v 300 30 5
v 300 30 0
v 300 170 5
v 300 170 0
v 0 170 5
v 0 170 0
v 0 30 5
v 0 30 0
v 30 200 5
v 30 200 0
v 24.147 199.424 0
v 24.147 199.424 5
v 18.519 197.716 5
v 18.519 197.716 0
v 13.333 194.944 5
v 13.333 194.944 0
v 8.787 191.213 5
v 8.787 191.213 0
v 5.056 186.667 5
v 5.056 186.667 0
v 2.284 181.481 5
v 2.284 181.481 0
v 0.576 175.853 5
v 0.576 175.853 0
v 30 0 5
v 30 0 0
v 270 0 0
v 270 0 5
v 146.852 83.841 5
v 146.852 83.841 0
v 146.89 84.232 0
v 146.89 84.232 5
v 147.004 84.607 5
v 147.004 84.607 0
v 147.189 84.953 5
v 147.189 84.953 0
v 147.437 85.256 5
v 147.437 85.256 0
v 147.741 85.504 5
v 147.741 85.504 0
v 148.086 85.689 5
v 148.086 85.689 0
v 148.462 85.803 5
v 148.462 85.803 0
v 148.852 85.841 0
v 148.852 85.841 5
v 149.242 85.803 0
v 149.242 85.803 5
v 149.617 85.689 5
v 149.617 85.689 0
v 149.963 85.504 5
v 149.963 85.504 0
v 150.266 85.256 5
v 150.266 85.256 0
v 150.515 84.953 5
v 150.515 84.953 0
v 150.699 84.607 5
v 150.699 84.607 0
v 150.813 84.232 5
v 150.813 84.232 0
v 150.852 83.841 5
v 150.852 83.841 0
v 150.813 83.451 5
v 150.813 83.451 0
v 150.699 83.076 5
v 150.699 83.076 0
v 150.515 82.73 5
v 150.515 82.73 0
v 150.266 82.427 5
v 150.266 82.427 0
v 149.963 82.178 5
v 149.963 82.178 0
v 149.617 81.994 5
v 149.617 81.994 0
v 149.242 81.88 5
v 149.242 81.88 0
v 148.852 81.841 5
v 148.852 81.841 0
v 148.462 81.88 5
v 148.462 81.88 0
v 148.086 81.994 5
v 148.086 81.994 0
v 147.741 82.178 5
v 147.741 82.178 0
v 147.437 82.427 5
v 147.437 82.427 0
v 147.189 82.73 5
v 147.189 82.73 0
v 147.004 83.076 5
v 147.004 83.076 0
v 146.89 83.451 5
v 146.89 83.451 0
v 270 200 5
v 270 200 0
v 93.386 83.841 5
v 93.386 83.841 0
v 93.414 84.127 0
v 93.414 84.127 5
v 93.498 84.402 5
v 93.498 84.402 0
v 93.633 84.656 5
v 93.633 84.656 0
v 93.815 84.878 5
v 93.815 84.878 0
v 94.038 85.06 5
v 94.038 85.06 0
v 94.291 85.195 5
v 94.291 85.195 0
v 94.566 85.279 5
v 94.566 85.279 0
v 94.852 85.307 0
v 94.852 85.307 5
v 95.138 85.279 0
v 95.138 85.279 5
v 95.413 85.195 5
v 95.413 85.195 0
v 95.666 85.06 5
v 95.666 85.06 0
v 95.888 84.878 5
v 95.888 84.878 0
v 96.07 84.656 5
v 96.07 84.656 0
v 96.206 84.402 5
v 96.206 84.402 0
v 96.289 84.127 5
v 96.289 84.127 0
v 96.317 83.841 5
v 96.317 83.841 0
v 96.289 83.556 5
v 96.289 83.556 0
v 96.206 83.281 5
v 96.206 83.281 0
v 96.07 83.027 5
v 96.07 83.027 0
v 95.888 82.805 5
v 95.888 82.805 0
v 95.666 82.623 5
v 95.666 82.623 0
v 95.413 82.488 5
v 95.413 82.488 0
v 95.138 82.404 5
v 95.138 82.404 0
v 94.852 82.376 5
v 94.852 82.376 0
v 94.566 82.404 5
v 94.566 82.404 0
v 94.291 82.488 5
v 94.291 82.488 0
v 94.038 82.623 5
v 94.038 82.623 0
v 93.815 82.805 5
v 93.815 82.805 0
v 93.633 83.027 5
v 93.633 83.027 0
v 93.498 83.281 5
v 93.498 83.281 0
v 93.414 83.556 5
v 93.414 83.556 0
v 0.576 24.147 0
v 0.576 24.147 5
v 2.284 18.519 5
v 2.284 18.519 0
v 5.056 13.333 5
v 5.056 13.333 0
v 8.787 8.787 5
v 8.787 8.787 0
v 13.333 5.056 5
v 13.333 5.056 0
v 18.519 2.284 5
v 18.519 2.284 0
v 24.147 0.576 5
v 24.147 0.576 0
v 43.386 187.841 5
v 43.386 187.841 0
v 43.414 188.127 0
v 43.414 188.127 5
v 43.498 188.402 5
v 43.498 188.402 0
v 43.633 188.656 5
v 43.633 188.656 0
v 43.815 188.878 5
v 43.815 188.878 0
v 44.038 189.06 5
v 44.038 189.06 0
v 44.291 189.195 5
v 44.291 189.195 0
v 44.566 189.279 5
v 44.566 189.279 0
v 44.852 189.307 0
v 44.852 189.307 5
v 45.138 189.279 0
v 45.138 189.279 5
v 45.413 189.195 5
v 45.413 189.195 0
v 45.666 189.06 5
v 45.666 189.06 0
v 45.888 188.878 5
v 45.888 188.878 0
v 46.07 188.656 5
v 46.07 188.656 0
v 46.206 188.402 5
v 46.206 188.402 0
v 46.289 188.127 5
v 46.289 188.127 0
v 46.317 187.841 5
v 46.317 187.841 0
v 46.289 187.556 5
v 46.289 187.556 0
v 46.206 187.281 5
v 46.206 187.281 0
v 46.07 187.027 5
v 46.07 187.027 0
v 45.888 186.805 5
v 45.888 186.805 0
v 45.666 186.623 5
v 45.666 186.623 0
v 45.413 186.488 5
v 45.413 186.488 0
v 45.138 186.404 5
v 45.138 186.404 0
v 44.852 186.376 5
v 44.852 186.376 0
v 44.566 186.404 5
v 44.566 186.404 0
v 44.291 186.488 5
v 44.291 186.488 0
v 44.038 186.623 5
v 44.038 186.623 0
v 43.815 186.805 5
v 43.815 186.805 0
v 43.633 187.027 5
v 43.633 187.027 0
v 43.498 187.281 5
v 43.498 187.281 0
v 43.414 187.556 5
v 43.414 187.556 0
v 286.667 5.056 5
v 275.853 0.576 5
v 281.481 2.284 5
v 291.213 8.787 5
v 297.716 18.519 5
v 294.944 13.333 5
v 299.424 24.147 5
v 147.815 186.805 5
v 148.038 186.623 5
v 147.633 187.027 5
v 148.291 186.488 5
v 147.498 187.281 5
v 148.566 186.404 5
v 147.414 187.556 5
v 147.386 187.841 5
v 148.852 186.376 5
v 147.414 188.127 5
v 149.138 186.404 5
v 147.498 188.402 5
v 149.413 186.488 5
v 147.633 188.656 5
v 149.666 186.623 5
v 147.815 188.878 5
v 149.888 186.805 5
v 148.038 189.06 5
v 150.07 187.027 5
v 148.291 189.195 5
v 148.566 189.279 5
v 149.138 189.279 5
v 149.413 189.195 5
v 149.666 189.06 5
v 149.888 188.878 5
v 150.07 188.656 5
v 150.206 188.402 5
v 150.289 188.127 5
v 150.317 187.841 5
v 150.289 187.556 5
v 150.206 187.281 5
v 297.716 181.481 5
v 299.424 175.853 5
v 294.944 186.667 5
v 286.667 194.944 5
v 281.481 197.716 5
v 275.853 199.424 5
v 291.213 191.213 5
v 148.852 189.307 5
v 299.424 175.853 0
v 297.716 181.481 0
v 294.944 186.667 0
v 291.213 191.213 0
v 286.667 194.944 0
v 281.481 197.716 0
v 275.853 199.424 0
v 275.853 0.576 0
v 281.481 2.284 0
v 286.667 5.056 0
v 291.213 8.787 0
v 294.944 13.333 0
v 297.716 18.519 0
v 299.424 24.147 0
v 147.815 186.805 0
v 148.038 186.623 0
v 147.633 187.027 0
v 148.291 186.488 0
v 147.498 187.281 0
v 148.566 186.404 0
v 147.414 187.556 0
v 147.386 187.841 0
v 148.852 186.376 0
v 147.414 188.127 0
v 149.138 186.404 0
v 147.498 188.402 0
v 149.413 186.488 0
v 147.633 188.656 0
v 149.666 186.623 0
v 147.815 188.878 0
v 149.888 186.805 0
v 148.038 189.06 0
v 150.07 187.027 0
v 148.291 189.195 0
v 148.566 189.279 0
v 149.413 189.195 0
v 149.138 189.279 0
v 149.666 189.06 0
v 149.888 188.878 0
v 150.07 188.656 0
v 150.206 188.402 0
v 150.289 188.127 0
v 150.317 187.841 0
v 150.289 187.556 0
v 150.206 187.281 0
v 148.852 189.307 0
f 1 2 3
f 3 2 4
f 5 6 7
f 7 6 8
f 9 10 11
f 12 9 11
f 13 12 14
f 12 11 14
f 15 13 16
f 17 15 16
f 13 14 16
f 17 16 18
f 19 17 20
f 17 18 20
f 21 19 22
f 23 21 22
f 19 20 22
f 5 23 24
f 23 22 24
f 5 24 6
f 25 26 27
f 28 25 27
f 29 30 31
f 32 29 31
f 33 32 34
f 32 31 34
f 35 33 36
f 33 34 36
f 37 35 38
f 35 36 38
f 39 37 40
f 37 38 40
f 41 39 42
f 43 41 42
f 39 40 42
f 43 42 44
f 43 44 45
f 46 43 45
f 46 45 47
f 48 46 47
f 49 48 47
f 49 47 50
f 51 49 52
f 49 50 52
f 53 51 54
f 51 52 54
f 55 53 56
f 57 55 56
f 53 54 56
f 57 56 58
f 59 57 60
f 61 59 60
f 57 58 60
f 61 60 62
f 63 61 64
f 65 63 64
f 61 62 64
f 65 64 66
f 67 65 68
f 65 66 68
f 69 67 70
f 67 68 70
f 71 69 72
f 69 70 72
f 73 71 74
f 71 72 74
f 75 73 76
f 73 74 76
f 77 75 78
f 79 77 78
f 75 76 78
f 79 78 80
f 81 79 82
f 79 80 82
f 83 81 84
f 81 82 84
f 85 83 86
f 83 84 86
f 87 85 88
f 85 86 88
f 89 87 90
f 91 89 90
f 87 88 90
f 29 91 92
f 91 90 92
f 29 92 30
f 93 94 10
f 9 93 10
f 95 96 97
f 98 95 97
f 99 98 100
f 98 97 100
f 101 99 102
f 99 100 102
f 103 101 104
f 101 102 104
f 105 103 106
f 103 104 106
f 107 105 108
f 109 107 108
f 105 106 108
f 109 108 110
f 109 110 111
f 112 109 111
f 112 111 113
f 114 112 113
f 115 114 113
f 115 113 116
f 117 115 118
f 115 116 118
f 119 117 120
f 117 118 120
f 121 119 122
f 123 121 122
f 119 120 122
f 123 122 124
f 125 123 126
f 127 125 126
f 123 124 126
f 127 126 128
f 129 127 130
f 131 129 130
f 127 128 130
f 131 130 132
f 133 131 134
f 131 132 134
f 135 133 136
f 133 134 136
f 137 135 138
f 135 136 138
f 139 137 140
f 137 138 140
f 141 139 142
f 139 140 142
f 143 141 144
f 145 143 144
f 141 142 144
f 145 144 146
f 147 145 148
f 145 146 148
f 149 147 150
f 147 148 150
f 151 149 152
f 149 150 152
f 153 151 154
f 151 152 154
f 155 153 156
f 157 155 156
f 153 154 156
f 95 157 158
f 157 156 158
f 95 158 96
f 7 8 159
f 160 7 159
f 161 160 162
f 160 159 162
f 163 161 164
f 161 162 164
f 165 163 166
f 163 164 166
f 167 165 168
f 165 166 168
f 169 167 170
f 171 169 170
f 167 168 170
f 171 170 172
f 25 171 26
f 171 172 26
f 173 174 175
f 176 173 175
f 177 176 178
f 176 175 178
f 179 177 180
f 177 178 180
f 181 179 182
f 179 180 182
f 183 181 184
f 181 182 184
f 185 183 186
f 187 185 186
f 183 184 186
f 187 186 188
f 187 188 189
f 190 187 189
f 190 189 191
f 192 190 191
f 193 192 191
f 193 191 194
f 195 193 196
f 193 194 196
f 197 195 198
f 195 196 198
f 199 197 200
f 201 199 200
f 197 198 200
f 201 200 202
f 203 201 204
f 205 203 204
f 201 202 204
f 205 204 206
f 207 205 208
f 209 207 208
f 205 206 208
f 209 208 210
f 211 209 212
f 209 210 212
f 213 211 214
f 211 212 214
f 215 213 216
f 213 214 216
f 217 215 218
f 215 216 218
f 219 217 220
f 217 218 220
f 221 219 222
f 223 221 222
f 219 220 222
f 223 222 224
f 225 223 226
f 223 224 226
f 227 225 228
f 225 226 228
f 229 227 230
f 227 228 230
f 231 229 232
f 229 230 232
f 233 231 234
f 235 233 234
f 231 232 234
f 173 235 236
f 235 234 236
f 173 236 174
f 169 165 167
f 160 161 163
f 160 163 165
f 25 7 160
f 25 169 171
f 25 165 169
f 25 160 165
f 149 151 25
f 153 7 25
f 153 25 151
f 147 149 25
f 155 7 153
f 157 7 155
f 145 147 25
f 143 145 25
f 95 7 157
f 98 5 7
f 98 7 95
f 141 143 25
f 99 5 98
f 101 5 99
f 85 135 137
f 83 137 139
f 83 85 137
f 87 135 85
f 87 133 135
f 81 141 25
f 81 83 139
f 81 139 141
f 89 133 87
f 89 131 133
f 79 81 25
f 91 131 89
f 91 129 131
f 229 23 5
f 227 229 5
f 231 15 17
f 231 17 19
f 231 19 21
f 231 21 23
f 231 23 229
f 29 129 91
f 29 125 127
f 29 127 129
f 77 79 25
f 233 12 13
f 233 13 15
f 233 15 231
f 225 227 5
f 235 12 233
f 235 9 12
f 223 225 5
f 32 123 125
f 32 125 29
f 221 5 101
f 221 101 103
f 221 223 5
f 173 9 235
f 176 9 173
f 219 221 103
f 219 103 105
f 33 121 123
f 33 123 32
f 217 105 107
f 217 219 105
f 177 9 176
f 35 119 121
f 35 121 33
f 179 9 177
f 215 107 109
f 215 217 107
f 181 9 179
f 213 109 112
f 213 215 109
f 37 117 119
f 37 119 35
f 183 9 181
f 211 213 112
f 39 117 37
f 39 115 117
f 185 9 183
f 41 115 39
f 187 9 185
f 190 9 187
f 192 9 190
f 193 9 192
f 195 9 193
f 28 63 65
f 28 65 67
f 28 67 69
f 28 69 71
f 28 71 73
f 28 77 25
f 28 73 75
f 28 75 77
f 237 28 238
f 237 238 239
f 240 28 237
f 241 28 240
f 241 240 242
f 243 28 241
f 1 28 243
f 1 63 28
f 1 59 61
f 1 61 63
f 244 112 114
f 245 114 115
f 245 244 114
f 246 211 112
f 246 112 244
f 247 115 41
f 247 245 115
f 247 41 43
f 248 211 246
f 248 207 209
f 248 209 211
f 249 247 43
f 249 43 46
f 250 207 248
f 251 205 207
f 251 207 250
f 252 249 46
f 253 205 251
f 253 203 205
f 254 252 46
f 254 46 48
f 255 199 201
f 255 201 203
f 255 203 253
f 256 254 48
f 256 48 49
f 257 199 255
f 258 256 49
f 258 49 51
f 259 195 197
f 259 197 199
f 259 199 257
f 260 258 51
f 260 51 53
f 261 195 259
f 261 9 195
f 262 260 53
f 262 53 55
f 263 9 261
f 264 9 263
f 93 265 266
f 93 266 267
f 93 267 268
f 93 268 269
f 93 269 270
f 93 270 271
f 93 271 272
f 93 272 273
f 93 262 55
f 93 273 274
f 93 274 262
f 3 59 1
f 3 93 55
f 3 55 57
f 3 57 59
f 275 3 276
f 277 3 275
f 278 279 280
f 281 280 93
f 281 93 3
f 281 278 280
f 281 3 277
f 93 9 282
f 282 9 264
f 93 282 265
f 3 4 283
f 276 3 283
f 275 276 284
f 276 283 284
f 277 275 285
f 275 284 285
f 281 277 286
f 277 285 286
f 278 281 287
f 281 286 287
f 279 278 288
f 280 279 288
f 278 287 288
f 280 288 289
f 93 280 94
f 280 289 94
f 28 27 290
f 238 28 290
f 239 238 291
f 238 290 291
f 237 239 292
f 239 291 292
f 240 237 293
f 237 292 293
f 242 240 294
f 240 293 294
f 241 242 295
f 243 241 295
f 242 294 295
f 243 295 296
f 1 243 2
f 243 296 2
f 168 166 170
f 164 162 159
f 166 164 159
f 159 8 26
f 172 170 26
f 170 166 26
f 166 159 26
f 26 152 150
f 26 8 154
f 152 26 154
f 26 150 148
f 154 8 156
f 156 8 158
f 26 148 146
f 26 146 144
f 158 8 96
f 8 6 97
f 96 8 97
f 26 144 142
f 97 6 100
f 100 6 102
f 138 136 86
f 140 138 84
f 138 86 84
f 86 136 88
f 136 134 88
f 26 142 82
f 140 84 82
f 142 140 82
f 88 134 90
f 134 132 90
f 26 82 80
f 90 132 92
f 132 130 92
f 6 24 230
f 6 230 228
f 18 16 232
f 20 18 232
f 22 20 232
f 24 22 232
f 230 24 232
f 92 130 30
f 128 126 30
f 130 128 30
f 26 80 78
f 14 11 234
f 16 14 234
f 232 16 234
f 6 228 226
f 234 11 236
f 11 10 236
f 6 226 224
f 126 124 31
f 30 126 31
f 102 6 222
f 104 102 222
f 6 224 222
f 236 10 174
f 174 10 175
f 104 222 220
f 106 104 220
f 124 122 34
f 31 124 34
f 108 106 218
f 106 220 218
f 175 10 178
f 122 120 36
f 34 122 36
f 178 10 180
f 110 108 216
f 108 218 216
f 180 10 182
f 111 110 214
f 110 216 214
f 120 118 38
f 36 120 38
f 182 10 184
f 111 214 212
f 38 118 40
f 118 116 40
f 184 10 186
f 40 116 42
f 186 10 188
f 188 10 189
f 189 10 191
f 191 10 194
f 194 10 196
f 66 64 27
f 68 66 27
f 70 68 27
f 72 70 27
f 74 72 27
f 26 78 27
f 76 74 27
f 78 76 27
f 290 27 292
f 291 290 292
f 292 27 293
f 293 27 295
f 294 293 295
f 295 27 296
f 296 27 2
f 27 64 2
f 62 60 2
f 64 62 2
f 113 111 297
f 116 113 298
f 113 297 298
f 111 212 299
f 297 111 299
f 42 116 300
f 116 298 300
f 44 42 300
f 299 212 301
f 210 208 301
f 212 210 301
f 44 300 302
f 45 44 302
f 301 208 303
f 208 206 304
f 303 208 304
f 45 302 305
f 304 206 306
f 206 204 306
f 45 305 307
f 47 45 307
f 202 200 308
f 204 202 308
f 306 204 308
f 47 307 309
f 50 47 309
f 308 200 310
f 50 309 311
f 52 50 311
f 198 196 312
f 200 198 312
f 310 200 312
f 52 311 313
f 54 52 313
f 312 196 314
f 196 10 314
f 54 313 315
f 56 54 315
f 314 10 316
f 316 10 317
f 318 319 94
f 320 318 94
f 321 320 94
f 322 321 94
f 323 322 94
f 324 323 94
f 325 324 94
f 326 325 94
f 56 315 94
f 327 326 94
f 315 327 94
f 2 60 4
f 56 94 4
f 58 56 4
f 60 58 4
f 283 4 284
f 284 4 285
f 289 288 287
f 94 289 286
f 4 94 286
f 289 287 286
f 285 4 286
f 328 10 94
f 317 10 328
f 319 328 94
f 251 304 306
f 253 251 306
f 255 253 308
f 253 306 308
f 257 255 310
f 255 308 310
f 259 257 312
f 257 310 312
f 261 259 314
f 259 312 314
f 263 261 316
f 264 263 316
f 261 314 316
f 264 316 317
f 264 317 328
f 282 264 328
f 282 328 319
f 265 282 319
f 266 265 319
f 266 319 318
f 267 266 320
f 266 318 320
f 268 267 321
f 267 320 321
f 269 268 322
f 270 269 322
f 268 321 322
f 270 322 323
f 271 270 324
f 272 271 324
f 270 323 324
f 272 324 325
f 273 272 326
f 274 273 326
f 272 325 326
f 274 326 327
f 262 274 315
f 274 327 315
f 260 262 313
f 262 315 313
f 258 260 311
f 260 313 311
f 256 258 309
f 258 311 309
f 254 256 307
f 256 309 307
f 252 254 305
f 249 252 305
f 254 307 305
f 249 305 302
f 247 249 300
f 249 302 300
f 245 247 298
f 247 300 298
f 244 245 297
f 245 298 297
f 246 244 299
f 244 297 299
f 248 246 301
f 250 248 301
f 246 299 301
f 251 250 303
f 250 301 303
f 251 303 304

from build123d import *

# Parameters (mm, degrees)
SALIENTE_EXTRUIR1_DEPTH = 5
CROQUIS2_R              = 1.465459125
CROQUIS2_R_2            = 2
CORTAR_EXTRUIR1_DEPTH   = 5


with BuildPart() as part:
    # Croquis1 → Saliente-Extruir1 (new body)
    with BuildSketch(Plane.XY):
        with BuildLine():
            Line((30, 0), (270, 0))
            ThreePointArc((270, 0), (291.213203436, 8.786796564), (300, 30))
            Line((300, 30), (300, 170))
            ThreePointArc((300, 170), (291.213203436, 191.213203436), (270, 200))
            Line((270, 200), (30, 200))
            ThreePointArc((30, 200), (8.786796564, 191.213203436), (0, 170))
            Line((0, 170), (0, 30))
            ThreePointArc((0, 30), (8.786796564, 8.786796564), (30, 0))
        make_face()
    extrude(amount=SALIENTE_EXTRUIR1_DEPTH)

    # Croquis2 → Cortar-Extruir1 (cut)
    with BuildSketch(Plane(origin=(0, 0, 0), x_dir=(-1, 0, 0), z_dir=(0, 0, -1))):
        with Locations((-148.851699579, 187.841418575)):
            Circle(CROQUIS2_R)
        with Locations((-44.851699579, 187.841418575)):
            Circle(CROQUIS2_R)
        with Locations((-94.851699579, 83.841418575)):
            Circle(CROQUIS2_R)
        with Locations((-148.851699579, 83.841418575)):
            Circle(CROQUIS2_R_2)
    extrude(amount=-CORTAR_EXTRUIR1_DEPTH, mode=Mode.SUBTRACT)


solid = part.part
